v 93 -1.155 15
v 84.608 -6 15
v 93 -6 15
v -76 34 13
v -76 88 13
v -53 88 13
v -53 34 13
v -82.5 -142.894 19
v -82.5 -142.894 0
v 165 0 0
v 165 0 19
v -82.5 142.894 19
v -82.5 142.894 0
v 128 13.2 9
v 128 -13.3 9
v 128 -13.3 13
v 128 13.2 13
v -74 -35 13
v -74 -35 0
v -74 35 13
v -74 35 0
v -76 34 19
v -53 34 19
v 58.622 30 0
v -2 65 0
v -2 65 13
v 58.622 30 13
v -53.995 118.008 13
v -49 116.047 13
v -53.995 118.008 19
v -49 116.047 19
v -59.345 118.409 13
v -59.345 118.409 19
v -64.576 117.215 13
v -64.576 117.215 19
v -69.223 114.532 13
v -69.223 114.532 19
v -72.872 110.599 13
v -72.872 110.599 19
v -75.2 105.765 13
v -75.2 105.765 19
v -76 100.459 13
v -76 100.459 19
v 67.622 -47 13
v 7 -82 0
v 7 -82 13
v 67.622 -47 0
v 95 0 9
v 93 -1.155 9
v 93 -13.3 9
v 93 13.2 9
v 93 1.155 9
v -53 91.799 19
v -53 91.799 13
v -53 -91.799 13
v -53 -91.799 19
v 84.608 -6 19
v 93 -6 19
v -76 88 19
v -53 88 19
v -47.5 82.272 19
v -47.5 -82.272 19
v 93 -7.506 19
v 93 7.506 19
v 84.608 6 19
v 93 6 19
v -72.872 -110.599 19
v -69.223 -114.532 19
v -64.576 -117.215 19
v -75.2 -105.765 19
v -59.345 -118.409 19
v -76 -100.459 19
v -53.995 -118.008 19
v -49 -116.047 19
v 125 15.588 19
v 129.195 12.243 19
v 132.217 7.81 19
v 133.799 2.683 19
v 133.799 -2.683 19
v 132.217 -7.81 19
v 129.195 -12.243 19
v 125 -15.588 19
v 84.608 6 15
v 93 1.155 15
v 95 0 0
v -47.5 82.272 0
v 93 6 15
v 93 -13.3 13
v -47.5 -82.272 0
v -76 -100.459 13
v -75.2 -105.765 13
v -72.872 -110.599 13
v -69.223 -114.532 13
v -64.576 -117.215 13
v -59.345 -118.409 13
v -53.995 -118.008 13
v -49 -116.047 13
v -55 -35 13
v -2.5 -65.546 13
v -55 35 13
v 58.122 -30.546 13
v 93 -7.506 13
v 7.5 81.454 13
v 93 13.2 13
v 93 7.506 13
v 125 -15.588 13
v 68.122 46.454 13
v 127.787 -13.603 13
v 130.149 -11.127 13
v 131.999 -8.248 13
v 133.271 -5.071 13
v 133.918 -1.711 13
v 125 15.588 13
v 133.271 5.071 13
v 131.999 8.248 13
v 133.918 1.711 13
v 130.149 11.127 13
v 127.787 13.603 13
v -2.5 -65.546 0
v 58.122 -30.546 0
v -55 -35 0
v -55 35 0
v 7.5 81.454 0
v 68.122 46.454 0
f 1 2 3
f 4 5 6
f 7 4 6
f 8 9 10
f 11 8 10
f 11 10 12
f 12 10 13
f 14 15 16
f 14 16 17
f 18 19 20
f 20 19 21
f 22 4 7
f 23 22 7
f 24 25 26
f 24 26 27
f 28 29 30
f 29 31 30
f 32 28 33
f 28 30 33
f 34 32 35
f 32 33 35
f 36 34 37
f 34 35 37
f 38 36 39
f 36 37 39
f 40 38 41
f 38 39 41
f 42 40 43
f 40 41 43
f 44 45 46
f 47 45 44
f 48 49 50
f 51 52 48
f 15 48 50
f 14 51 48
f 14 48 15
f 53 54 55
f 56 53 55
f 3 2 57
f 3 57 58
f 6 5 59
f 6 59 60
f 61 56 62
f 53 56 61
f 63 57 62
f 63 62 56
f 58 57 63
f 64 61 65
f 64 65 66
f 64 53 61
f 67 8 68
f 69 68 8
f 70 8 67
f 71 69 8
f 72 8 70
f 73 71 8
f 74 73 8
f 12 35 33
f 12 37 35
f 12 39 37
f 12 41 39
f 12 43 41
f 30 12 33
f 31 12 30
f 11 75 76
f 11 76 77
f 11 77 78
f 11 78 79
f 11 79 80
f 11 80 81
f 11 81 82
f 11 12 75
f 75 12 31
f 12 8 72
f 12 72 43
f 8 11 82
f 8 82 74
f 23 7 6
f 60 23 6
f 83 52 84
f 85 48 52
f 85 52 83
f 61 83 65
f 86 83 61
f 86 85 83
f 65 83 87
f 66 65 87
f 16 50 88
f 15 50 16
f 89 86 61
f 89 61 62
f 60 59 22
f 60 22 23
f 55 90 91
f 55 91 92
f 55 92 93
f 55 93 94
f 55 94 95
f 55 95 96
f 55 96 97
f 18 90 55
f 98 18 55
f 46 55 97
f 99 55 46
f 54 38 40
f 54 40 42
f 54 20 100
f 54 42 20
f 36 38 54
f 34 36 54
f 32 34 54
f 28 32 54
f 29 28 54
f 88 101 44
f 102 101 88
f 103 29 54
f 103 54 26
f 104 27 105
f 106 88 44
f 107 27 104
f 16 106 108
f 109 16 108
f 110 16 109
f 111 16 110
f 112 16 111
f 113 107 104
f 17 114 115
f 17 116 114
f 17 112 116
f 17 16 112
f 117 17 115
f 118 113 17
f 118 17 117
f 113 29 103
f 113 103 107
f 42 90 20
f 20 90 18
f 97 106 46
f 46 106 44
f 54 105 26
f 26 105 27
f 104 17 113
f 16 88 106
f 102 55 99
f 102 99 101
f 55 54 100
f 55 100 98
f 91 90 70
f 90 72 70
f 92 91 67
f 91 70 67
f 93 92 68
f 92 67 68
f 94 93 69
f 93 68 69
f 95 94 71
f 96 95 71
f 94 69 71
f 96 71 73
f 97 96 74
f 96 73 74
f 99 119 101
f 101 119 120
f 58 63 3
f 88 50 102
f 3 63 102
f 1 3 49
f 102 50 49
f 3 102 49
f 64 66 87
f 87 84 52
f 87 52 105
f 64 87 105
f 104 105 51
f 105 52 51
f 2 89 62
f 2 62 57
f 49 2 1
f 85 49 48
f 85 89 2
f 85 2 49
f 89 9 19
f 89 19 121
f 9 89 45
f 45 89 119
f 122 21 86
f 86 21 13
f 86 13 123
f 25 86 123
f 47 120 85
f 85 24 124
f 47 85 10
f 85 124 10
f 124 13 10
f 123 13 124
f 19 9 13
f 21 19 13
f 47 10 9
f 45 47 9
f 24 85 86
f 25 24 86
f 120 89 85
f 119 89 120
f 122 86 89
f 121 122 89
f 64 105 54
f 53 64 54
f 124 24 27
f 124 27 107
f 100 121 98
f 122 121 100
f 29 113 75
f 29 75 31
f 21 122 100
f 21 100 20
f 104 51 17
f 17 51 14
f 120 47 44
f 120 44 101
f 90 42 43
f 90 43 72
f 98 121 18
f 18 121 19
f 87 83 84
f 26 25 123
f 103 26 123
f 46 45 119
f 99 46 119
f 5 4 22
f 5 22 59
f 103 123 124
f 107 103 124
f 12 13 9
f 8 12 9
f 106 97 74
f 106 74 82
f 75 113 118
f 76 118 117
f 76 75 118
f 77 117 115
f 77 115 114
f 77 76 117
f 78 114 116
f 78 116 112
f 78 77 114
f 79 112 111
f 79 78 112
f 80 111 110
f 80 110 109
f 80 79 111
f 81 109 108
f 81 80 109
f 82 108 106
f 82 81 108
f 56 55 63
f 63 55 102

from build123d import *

# Parameters (mm, degrees)
BOX005_W               = 23
BOX005_H               = 54
BOX005_DEPTH           = 6
PRISM003_DEPTH         = 6
PRISM002_DEPTH         = 6
BOX004_W               = 10
BOX004_H               = 12
BOX004_DEPTH           = 4
BOX003_W               = 35
BOX003_H               = 26.5
BOX003_DEPTH           = 10
BOX002_W               = 70
BOX002_H               = 19
BOX002_DEPTH           = 19
BOX002_PLACEMENT_ANGLE = 30
BOX001_W               = 70
BOX001_H               = 19
BOX001_DEPTH           = 19
BOX001_PLACEMENT_ANGLE = 90
BOX_W                  = 70
BOX_H                  = 19
BOX_DEPTH              = 19
BOX_PLACEMENT_ANGLE    = 30
PRISM001_DEPTH         = 19
PRISM_DEPTH            = 19
FILLET_R               = 18


with BuildPart() as box005:
    # Box005 → Box005 (new body)
    with BuildSketch(Plane(origin=(-76, 34, 13), x_dir=(1, 0, 0), z_dir=(0, 0, 1))):
        with Locations((11.5, 27)):
            Rectangle(BOX005_W, BOX005_H)
    extrude(amount=BOX005_DEPTH)


with BuildPart() as prism003:
    # Prism003 → Prism003 (new body)
    with BuildSketch(Plane.XY.offset(13)):
        Polygon((106, 0), (-53, 91.798693), (-53, -91.798693), align=None)
    extrude(amount=PRISM003_DEPTH)


with BuildPart() as cut006:
    # Prism002 → Prism002 (new body)
    with BuildSketch(Plane.XY.offset(13)):
        Polygon((152, 0), (-76, 131.635861), (-76, -131.635861), align=None)
    extrude(amount=PRISM002_DEPTH)

    # Cut006: cut Prism003
    add(prism003.part, mode=Mode.SUBTRACT)


with BuildPart() as box004:
    # Box004 → Box004 (new body)
    with BuildSketch(Plane(origin=(84, -6, 15), x_dir=(1, 0, 0), z_dir=(0, 0, 1))):
        with Locations((5, 6)):
            Rectangle(BOX004_W, BOX004_H)
    extrude(amount=BOX004_DEPTH)


with BuildPart() as box003:
    # Box003 → Box003 (new body)
    with BuildSketch(Plane(origin=(93, -13.3, 9), x_dir=(1, 0, 0), z_dir=(0, 0, 1))):
        with Locations((17.5, 13.25)):
            Rectangle(BOX003_W, BOX003_H)
    extrude(amount=BOX003_DEPTH)


with BuildPart() as box002:
    # Box002 → Box002 (new body)
    with BuildSketch(Plane.XY):
        with Locations((35, 9.5)):
            Rectangle(BOX002_W, BOX002_H)
    extrude(amount=BOX002_DEPTH)


with BuildPart() as box002_1:
    # Box002 placement: moved
    add(box002.part.moved(Location((7, -82, 0))).rotate(Axis((7, -82, 0), (0, 0, 1)), BOX002_PLACEMENT_ANGLE))


with BuildPart() as box001:
    # Box001 → Box001 (new body)
    with BuildSketch(Plane.XY):
        with Locations((35, 9.5)):
            Rectangle(BOX001_W, BOX001_H)
    extrude(amount=BOX001_DEPTH)


with BuildPart() as box001_1:
    # Box001 placement: moved
    add(box001.part.moved(Location((-55, -35, 0))).rotate(Axis((-55, -35, 0), (0, 0, 1)), BOX001_PLACEMENT_ANGLE))


with BuildPart() as box:
    # Box → Box (new body)
    with BuildSketch(Plane.XY):
        with Locations((35, 9.5)):
            Rectangle(BOX_W, BOX_H)
    extrude(amount=BOX_DEPTH)


with BuildPart() as box_1:
    # Box placement: moved
    add(box.part.moved(Location((-2, 65, 0))).rotate(Axis((-2, 65, 0), (0, 0, -1)), BOX_PLACEMENT_ANGLE))


with BuildPart() as prism001:
    # Prism001 → Prism001 (new body)
    with BuildSketch(Plane.XY):
        Polygon((95, 0), (-47.5, 82.272413), (-47.5, -82.272413), align=None)
    extrude(amount=PRISM001_DEPTH)


with BuildPart() as fillet_body:
    # Prism → Prism (new body)
    with BuildSketch(Plane.XY):
        Polygon((165, 0), (-82.5, 142.894192), (-82.5, -142.894192), align=None)
    extrude(amount=PRISM_DEPTH)

    # Cut: cut Prism001
    add(prism001.part, mode=Mode.SUBTRACT)

    # Cut001: cut Box
    add(box_1.part, mode=Mode.SUBTRACT)

    # Cut002: cut Box001
    add(box001_1.part, mode=Mode.SUBTRACT)

    # Cut003: cut Box002
    add(box002_1.part, mode=Mode.SUBTRACT)

    # Cut004: cut Box003
    add(box003.part, mode=Mode.SUBTRACT)

    # Cut005: cut Box004
    add(box004.part, mode=Mode.SUBTRACT)

    # Cut007: cut Cut006
    add(cut006.part, mode=Mode.SUBTRACT)

    # Fillet
    fillet_edges = [fillet_body.edges().sort_by_distance(p)[0] for p in [
        (-76, 131.635861, 16),
        (-76, -131.635861, 16),
        (152, 0, 16),
    ]]
    fillet(fillet_edges, radius=FILLET_R)


solid = Compound([box005.part, fillet_body.part])
